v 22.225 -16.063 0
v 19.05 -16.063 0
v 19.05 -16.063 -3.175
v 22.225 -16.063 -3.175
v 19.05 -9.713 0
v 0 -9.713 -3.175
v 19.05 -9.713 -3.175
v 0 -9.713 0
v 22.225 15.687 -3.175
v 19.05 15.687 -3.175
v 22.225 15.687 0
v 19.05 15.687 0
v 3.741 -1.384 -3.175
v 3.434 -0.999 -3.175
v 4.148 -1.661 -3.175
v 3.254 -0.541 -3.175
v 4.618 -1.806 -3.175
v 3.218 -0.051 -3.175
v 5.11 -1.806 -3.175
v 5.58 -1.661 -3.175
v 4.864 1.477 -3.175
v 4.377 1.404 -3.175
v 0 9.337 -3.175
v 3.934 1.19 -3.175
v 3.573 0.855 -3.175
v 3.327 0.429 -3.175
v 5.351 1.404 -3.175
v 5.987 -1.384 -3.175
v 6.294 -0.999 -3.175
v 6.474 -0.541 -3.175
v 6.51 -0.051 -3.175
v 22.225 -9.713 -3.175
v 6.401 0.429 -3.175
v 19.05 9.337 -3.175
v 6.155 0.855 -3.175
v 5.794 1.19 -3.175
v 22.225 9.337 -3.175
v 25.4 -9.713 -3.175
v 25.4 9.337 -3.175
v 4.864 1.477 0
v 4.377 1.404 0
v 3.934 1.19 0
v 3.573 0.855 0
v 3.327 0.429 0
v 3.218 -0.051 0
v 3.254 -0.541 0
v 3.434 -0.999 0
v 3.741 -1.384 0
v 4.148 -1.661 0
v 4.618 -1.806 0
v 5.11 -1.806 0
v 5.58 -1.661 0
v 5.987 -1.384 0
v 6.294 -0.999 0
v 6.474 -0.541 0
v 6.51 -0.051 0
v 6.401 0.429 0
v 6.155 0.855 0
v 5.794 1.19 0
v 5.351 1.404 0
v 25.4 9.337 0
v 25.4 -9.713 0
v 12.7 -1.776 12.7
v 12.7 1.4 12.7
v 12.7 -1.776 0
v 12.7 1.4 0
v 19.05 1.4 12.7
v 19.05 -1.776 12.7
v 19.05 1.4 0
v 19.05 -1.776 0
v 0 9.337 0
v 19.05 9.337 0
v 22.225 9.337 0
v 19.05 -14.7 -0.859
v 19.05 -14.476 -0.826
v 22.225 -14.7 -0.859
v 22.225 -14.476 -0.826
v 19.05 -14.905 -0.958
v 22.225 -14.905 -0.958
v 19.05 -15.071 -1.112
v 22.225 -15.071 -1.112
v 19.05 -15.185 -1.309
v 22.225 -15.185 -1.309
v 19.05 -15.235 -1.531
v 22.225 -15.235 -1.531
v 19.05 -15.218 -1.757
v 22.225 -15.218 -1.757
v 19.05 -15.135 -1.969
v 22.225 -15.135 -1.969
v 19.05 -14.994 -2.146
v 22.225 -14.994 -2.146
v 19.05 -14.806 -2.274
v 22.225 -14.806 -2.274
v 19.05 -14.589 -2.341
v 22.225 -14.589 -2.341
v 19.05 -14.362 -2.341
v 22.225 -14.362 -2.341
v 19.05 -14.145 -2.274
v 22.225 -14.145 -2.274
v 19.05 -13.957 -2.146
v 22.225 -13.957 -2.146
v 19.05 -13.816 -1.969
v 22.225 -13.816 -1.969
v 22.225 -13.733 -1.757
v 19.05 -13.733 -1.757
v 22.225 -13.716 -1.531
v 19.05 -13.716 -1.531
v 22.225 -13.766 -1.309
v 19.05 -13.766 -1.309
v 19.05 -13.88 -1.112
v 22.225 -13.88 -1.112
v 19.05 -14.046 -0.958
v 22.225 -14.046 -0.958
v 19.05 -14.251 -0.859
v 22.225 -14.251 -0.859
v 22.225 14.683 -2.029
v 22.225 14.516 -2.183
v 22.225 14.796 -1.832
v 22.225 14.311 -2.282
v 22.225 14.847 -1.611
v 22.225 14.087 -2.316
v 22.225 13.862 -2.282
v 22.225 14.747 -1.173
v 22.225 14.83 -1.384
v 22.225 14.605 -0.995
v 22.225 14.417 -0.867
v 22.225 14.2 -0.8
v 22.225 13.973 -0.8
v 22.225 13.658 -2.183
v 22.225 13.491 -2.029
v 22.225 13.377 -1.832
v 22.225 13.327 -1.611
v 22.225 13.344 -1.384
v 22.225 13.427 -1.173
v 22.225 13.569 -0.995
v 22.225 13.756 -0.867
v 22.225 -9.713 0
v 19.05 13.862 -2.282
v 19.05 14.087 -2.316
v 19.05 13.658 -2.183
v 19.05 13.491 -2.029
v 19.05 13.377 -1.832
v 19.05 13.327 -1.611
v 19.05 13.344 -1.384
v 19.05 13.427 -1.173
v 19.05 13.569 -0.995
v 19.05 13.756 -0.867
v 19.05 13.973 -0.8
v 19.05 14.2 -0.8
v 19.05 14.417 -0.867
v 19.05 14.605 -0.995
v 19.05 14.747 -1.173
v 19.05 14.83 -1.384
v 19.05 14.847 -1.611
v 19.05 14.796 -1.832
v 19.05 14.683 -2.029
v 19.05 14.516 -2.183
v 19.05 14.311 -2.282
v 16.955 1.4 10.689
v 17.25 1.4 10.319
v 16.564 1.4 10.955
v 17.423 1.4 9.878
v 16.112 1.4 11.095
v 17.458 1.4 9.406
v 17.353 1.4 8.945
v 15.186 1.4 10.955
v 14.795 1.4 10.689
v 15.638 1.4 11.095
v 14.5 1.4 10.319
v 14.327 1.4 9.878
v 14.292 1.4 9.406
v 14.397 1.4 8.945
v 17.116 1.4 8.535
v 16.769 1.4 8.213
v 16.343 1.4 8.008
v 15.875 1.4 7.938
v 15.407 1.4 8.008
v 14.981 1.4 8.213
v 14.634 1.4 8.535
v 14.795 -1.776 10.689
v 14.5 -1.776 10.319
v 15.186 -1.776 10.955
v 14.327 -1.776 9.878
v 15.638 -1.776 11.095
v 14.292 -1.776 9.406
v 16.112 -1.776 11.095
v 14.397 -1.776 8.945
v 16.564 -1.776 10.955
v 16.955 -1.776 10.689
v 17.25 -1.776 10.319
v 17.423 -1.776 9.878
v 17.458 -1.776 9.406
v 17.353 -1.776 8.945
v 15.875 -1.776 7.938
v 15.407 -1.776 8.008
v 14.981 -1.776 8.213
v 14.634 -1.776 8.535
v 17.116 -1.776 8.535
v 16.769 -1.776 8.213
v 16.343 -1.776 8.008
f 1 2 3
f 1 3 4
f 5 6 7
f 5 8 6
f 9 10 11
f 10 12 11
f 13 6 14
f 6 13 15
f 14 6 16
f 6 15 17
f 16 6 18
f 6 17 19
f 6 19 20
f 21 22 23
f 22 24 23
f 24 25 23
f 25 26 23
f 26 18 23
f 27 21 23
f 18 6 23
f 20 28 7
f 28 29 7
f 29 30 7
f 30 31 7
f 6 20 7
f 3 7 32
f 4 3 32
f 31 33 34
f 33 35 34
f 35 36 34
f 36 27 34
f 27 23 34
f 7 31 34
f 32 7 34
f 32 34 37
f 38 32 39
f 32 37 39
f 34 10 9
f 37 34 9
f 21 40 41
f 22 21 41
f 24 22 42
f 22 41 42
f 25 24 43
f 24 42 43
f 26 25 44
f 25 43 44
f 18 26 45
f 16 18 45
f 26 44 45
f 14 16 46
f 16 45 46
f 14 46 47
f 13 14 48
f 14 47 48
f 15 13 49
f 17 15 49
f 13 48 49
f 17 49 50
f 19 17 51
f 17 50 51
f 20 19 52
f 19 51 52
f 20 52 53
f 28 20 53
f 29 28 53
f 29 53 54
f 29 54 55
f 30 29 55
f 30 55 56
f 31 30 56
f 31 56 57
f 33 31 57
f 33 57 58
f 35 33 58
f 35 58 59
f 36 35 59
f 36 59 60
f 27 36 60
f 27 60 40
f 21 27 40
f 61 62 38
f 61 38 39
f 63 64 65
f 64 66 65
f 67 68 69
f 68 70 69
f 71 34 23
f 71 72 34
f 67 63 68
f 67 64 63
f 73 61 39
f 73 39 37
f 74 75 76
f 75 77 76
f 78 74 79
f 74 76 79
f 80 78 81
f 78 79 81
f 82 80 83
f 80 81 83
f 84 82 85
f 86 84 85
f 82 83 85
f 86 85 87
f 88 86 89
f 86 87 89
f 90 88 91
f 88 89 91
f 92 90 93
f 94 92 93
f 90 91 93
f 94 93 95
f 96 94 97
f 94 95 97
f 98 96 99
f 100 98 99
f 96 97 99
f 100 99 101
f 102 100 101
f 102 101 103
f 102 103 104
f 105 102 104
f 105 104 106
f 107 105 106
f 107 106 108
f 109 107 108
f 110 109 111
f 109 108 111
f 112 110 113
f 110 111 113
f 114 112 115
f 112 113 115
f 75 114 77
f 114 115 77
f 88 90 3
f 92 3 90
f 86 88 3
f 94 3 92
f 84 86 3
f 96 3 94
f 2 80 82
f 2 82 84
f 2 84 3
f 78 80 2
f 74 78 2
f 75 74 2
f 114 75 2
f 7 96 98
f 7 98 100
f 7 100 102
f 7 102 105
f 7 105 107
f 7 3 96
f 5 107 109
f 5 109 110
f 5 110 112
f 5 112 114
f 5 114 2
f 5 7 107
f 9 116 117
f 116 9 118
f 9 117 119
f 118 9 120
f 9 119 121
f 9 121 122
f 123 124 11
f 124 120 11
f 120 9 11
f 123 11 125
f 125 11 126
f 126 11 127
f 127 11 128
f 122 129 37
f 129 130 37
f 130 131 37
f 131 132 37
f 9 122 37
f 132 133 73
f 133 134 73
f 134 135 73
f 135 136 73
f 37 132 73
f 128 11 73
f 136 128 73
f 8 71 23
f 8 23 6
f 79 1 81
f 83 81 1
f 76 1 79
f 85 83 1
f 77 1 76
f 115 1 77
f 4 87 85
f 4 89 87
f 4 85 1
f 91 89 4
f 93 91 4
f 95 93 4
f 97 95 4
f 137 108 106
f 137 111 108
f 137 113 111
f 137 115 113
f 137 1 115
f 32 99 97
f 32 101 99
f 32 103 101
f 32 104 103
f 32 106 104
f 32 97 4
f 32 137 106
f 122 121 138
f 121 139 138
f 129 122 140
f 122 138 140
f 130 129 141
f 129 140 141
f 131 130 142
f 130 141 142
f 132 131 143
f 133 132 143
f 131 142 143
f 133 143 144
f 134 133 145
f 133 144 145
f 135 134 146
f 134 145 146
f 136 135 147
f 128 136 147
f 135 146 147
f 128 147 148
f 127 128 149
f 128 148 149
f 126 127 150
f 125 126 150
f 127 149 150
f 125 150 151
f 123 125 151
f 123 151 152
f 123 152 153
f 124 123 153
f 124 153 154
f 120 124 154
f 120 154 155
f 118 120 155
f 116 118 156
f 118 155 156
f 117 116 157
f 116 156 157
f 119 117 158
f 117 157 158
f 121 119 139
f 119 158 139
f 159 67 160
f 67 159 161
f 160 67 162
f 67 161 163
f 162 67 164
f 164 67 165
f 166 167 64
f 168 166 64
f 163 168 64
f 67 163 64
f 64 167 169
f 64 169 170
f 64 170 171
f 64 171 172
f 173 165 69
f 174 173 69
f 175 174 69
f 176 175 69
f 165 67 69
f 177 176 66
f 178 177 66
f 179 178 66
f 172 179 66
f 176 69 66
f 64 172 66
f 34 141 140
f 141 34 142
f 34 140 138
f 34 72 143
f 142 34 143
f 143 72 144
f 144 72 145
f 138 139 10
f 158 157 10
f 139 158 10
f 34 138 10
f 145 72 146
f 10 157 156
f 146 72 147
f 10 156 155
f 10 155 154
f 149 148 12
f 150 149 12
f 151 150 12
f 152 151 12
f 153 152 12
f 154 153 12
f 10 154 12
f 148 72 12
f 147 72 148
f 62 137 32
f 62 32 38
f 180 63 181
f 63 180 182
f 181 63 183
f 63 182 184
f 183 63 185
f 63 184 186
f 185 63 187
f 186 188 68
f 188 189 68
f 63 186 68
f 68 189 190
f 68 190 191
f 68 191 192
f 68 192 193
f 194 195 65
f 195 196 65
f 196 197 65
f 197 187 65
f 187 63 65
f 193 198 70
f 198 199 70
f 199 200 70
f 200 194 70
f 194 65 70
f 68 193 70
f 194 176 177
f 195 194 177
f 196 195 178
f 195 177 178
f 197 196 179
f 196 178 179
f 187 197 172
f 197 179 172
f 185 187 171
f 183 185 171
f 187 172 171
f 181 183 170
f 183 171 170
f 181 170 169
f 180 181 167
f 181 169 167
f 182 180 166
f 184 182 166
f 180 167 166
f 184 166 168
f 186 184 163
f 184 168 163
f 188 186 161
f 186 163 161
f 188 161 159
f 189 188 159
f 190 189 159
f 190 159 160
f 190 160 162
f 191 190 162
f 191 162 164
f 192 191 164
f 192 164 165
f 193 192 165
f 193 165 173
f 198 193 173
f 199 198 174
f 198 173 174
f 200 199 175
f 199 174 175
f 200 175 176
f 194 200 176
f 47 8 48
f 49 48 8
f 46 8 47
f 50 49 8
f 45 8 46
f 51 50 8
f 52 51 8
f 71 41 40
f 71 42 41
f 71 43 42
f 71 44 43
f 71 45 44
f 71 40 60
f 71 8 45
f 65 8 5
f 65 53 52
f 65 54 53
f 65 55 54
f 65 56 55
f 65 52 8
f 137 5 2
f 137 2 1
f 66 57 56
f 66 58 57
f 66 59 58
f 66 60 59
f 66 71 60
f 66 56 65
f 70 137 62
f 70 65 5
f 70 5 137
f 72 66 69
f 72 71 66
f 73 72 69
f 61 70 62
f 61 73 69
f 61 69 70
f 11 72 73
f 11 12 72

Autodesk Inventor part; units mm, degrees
ref_plane "YZ Plane" through (0, 0, 0) normal (1, 0, 0) x (0, 1, 0)
ref_plane "XZ Plane" through (0, 0, 0) normal (0, 1, 0) x (-1, 0, 0)
ref_plane "XY Plane" through (0, 0, 0) normal (0, 0, 1) x (1, 0, 0)
sketch "Sketch1" plane through (0, 0, 0) normal (0, 0, 1) x (1, 0, 0)
  line L0 (0, -9.713) -> (25.4, -9.713)
  line L1 (25.4, -9.713) -> (25.4, 9.337)
  line L2 (0, 9.337) -> (0, -9.713)
  line L3 (19.05, 9.337) -> (19.05, 15.687)
  line L4 (19.05, 15.687) -> (22.225, 15.687)
  line L5 (22.225, 15.687) -> (22.225, 9.337)
  line L6 (25.4, 9.337) -> (22.225, 9.337)
  line L7 (19.05, 9.337) -> (0, 9.337)
  dimension "d0" = 19.05
  dimension "d2" = 25.4
  dimension "d3" = 3.175
  dimension "d4" = 6.35
  dimension "d22" = 3.175
extrude "Extrusion1" add sketch "Sketch1" against normal blind 3.175
sketch "Sketch2" plane through (0, 0, 0) normal (0, 0, 1) x (1, 0, 0)
  line L0 (12.7, -1.7755) -> (19.05, -1.7755)
  line L1 (19.05, -1.7755) -> (19.05, 1.3995)
  line L2 (19.05, 1.3995) -> (12.7, 1.3995)
  line L3 (12.7, 1.3995) -> (12.7, -1.7755)
  line L4 (0, 9.337) -> (0, -9.713) projected
  line L5 (25.4, 9.337) -> (22.225, 9.337) projected
  line L6 (25.4, -9.713) -> (25.4, 9.337) projected
  dimension "d7" = 3.175
  dimension "d10" = 6.35
  dimension "d11" = 7.9375
  dimension "d12" = 6.35
extrude "Extrusion2" add sketch "Sketch2" along normal blind 12.7
sketch "Sketch3" plane through (22.225, 9.337, 0) normal (1, 0, 0) x (0, 0, -1)
  line L0 (0, 0) -> (0, 6.35) projected
  line L1 (0, 0) -> (3.175, 0) projected
  line L2 (3.175, 6.35) -> (3.175, 0) projected
  line L3 (0, 6.35) -> (3.175, 6.35) projected
  point P0 (1.5537, 4.7498)
  dimension "d38" = 1.6002
hole "Hole1" at (22.225, 14.0868, -1.5537) direction (-1, 0, 0) diameter 1.524 end through all
sketch "Sketch5" plane through (0, 0, -3.175) normal (0, 0, -1) x (-1, 0, 0)
  line L0 (-25.4, -9.713) -> (0, -9.713) projected
  line L1 (0, -9.713) -> (0, 9.337) projected
  line L2 (0, 9.337) -> (-19.05, 9.337) projected
  line L3 (-19.05, 9.337) -> (-19.05, 15.687) projected
  line L4 (-19.05, 15.687) -> (-22.225, 15.687) projected
  line L5 (-22.225, 15.687) -> (-22.225, 9.337) projected
  line L6 (-22.225, 9.337) -> (-25.4, 9.337) projected
  line L7 (-25.4, 9.337) -> (-25.4, -9.713) projected
  point P0 (-22.225, -11.491)
  point P1 (-4.8639, -0.1739)
  dimension "d37" = 3.175
hole "Hole3" at (4.8639, -0.1739, -3.175) at (22.225, -11.491, -3.175) direction (0, 0, 1) diameter 3.302 end through all thread size "8-32 UNC" class "2B" standard "ANSI Unified Screw Threads"
sketch "Sketch6" plane through (22.225, 9.337, 0) normal (1, 0, 0) x (0, 0, -1)
  point P0 (0, -9.337)
sketch "Sketch7" plane through (0, 0, 0) normal (0, 0, 1) x (1, 0, 0)
  point P0 (0, 0)
sketch "Sketch8" plane through (0, -9.713, 0) normal (0, -1, 0) x (1, 0, 0)
  line L0 (25.4, 0) -> (22.225, 0) projected
  line L1 (22.225, 0) -> (22.225, -3.175) projected
  line L2 (19.05, -3.175) -> (22.225, -3.175) projected
  line L3 (0, 0) -> (25.4, 0) projected
  line L4 (22.225, -3.175) -> (25.4, -3.175) projected
  line L5 (22.225, -3.175) -> (19.05, -3.175)
  line L6 (19.05, -3.175) -> (19.05, 0)
  line L7 (19.05, 0) -> (22.225, 0)
  line L8 (22.225, 0) -> (22.225, -3.175)
extrude "Extrusion3" add sketch "Sketch8" along normal blind 6.35
hole "Hole4" at (19.05, -14.4755, -1.5875) direction (1, 0, 0) diameter 1.524 depth 25.4 tip angle 118
hole "Hole5" at (15.875, -1.7755, 9.525) direction (0, 1, 0) diameter 3.175 depth 25.4 tip angle 118
equation "\"d11\" = -0.5 * d7 + 0.5 * d0"
properties part number "slide pivot plate"
